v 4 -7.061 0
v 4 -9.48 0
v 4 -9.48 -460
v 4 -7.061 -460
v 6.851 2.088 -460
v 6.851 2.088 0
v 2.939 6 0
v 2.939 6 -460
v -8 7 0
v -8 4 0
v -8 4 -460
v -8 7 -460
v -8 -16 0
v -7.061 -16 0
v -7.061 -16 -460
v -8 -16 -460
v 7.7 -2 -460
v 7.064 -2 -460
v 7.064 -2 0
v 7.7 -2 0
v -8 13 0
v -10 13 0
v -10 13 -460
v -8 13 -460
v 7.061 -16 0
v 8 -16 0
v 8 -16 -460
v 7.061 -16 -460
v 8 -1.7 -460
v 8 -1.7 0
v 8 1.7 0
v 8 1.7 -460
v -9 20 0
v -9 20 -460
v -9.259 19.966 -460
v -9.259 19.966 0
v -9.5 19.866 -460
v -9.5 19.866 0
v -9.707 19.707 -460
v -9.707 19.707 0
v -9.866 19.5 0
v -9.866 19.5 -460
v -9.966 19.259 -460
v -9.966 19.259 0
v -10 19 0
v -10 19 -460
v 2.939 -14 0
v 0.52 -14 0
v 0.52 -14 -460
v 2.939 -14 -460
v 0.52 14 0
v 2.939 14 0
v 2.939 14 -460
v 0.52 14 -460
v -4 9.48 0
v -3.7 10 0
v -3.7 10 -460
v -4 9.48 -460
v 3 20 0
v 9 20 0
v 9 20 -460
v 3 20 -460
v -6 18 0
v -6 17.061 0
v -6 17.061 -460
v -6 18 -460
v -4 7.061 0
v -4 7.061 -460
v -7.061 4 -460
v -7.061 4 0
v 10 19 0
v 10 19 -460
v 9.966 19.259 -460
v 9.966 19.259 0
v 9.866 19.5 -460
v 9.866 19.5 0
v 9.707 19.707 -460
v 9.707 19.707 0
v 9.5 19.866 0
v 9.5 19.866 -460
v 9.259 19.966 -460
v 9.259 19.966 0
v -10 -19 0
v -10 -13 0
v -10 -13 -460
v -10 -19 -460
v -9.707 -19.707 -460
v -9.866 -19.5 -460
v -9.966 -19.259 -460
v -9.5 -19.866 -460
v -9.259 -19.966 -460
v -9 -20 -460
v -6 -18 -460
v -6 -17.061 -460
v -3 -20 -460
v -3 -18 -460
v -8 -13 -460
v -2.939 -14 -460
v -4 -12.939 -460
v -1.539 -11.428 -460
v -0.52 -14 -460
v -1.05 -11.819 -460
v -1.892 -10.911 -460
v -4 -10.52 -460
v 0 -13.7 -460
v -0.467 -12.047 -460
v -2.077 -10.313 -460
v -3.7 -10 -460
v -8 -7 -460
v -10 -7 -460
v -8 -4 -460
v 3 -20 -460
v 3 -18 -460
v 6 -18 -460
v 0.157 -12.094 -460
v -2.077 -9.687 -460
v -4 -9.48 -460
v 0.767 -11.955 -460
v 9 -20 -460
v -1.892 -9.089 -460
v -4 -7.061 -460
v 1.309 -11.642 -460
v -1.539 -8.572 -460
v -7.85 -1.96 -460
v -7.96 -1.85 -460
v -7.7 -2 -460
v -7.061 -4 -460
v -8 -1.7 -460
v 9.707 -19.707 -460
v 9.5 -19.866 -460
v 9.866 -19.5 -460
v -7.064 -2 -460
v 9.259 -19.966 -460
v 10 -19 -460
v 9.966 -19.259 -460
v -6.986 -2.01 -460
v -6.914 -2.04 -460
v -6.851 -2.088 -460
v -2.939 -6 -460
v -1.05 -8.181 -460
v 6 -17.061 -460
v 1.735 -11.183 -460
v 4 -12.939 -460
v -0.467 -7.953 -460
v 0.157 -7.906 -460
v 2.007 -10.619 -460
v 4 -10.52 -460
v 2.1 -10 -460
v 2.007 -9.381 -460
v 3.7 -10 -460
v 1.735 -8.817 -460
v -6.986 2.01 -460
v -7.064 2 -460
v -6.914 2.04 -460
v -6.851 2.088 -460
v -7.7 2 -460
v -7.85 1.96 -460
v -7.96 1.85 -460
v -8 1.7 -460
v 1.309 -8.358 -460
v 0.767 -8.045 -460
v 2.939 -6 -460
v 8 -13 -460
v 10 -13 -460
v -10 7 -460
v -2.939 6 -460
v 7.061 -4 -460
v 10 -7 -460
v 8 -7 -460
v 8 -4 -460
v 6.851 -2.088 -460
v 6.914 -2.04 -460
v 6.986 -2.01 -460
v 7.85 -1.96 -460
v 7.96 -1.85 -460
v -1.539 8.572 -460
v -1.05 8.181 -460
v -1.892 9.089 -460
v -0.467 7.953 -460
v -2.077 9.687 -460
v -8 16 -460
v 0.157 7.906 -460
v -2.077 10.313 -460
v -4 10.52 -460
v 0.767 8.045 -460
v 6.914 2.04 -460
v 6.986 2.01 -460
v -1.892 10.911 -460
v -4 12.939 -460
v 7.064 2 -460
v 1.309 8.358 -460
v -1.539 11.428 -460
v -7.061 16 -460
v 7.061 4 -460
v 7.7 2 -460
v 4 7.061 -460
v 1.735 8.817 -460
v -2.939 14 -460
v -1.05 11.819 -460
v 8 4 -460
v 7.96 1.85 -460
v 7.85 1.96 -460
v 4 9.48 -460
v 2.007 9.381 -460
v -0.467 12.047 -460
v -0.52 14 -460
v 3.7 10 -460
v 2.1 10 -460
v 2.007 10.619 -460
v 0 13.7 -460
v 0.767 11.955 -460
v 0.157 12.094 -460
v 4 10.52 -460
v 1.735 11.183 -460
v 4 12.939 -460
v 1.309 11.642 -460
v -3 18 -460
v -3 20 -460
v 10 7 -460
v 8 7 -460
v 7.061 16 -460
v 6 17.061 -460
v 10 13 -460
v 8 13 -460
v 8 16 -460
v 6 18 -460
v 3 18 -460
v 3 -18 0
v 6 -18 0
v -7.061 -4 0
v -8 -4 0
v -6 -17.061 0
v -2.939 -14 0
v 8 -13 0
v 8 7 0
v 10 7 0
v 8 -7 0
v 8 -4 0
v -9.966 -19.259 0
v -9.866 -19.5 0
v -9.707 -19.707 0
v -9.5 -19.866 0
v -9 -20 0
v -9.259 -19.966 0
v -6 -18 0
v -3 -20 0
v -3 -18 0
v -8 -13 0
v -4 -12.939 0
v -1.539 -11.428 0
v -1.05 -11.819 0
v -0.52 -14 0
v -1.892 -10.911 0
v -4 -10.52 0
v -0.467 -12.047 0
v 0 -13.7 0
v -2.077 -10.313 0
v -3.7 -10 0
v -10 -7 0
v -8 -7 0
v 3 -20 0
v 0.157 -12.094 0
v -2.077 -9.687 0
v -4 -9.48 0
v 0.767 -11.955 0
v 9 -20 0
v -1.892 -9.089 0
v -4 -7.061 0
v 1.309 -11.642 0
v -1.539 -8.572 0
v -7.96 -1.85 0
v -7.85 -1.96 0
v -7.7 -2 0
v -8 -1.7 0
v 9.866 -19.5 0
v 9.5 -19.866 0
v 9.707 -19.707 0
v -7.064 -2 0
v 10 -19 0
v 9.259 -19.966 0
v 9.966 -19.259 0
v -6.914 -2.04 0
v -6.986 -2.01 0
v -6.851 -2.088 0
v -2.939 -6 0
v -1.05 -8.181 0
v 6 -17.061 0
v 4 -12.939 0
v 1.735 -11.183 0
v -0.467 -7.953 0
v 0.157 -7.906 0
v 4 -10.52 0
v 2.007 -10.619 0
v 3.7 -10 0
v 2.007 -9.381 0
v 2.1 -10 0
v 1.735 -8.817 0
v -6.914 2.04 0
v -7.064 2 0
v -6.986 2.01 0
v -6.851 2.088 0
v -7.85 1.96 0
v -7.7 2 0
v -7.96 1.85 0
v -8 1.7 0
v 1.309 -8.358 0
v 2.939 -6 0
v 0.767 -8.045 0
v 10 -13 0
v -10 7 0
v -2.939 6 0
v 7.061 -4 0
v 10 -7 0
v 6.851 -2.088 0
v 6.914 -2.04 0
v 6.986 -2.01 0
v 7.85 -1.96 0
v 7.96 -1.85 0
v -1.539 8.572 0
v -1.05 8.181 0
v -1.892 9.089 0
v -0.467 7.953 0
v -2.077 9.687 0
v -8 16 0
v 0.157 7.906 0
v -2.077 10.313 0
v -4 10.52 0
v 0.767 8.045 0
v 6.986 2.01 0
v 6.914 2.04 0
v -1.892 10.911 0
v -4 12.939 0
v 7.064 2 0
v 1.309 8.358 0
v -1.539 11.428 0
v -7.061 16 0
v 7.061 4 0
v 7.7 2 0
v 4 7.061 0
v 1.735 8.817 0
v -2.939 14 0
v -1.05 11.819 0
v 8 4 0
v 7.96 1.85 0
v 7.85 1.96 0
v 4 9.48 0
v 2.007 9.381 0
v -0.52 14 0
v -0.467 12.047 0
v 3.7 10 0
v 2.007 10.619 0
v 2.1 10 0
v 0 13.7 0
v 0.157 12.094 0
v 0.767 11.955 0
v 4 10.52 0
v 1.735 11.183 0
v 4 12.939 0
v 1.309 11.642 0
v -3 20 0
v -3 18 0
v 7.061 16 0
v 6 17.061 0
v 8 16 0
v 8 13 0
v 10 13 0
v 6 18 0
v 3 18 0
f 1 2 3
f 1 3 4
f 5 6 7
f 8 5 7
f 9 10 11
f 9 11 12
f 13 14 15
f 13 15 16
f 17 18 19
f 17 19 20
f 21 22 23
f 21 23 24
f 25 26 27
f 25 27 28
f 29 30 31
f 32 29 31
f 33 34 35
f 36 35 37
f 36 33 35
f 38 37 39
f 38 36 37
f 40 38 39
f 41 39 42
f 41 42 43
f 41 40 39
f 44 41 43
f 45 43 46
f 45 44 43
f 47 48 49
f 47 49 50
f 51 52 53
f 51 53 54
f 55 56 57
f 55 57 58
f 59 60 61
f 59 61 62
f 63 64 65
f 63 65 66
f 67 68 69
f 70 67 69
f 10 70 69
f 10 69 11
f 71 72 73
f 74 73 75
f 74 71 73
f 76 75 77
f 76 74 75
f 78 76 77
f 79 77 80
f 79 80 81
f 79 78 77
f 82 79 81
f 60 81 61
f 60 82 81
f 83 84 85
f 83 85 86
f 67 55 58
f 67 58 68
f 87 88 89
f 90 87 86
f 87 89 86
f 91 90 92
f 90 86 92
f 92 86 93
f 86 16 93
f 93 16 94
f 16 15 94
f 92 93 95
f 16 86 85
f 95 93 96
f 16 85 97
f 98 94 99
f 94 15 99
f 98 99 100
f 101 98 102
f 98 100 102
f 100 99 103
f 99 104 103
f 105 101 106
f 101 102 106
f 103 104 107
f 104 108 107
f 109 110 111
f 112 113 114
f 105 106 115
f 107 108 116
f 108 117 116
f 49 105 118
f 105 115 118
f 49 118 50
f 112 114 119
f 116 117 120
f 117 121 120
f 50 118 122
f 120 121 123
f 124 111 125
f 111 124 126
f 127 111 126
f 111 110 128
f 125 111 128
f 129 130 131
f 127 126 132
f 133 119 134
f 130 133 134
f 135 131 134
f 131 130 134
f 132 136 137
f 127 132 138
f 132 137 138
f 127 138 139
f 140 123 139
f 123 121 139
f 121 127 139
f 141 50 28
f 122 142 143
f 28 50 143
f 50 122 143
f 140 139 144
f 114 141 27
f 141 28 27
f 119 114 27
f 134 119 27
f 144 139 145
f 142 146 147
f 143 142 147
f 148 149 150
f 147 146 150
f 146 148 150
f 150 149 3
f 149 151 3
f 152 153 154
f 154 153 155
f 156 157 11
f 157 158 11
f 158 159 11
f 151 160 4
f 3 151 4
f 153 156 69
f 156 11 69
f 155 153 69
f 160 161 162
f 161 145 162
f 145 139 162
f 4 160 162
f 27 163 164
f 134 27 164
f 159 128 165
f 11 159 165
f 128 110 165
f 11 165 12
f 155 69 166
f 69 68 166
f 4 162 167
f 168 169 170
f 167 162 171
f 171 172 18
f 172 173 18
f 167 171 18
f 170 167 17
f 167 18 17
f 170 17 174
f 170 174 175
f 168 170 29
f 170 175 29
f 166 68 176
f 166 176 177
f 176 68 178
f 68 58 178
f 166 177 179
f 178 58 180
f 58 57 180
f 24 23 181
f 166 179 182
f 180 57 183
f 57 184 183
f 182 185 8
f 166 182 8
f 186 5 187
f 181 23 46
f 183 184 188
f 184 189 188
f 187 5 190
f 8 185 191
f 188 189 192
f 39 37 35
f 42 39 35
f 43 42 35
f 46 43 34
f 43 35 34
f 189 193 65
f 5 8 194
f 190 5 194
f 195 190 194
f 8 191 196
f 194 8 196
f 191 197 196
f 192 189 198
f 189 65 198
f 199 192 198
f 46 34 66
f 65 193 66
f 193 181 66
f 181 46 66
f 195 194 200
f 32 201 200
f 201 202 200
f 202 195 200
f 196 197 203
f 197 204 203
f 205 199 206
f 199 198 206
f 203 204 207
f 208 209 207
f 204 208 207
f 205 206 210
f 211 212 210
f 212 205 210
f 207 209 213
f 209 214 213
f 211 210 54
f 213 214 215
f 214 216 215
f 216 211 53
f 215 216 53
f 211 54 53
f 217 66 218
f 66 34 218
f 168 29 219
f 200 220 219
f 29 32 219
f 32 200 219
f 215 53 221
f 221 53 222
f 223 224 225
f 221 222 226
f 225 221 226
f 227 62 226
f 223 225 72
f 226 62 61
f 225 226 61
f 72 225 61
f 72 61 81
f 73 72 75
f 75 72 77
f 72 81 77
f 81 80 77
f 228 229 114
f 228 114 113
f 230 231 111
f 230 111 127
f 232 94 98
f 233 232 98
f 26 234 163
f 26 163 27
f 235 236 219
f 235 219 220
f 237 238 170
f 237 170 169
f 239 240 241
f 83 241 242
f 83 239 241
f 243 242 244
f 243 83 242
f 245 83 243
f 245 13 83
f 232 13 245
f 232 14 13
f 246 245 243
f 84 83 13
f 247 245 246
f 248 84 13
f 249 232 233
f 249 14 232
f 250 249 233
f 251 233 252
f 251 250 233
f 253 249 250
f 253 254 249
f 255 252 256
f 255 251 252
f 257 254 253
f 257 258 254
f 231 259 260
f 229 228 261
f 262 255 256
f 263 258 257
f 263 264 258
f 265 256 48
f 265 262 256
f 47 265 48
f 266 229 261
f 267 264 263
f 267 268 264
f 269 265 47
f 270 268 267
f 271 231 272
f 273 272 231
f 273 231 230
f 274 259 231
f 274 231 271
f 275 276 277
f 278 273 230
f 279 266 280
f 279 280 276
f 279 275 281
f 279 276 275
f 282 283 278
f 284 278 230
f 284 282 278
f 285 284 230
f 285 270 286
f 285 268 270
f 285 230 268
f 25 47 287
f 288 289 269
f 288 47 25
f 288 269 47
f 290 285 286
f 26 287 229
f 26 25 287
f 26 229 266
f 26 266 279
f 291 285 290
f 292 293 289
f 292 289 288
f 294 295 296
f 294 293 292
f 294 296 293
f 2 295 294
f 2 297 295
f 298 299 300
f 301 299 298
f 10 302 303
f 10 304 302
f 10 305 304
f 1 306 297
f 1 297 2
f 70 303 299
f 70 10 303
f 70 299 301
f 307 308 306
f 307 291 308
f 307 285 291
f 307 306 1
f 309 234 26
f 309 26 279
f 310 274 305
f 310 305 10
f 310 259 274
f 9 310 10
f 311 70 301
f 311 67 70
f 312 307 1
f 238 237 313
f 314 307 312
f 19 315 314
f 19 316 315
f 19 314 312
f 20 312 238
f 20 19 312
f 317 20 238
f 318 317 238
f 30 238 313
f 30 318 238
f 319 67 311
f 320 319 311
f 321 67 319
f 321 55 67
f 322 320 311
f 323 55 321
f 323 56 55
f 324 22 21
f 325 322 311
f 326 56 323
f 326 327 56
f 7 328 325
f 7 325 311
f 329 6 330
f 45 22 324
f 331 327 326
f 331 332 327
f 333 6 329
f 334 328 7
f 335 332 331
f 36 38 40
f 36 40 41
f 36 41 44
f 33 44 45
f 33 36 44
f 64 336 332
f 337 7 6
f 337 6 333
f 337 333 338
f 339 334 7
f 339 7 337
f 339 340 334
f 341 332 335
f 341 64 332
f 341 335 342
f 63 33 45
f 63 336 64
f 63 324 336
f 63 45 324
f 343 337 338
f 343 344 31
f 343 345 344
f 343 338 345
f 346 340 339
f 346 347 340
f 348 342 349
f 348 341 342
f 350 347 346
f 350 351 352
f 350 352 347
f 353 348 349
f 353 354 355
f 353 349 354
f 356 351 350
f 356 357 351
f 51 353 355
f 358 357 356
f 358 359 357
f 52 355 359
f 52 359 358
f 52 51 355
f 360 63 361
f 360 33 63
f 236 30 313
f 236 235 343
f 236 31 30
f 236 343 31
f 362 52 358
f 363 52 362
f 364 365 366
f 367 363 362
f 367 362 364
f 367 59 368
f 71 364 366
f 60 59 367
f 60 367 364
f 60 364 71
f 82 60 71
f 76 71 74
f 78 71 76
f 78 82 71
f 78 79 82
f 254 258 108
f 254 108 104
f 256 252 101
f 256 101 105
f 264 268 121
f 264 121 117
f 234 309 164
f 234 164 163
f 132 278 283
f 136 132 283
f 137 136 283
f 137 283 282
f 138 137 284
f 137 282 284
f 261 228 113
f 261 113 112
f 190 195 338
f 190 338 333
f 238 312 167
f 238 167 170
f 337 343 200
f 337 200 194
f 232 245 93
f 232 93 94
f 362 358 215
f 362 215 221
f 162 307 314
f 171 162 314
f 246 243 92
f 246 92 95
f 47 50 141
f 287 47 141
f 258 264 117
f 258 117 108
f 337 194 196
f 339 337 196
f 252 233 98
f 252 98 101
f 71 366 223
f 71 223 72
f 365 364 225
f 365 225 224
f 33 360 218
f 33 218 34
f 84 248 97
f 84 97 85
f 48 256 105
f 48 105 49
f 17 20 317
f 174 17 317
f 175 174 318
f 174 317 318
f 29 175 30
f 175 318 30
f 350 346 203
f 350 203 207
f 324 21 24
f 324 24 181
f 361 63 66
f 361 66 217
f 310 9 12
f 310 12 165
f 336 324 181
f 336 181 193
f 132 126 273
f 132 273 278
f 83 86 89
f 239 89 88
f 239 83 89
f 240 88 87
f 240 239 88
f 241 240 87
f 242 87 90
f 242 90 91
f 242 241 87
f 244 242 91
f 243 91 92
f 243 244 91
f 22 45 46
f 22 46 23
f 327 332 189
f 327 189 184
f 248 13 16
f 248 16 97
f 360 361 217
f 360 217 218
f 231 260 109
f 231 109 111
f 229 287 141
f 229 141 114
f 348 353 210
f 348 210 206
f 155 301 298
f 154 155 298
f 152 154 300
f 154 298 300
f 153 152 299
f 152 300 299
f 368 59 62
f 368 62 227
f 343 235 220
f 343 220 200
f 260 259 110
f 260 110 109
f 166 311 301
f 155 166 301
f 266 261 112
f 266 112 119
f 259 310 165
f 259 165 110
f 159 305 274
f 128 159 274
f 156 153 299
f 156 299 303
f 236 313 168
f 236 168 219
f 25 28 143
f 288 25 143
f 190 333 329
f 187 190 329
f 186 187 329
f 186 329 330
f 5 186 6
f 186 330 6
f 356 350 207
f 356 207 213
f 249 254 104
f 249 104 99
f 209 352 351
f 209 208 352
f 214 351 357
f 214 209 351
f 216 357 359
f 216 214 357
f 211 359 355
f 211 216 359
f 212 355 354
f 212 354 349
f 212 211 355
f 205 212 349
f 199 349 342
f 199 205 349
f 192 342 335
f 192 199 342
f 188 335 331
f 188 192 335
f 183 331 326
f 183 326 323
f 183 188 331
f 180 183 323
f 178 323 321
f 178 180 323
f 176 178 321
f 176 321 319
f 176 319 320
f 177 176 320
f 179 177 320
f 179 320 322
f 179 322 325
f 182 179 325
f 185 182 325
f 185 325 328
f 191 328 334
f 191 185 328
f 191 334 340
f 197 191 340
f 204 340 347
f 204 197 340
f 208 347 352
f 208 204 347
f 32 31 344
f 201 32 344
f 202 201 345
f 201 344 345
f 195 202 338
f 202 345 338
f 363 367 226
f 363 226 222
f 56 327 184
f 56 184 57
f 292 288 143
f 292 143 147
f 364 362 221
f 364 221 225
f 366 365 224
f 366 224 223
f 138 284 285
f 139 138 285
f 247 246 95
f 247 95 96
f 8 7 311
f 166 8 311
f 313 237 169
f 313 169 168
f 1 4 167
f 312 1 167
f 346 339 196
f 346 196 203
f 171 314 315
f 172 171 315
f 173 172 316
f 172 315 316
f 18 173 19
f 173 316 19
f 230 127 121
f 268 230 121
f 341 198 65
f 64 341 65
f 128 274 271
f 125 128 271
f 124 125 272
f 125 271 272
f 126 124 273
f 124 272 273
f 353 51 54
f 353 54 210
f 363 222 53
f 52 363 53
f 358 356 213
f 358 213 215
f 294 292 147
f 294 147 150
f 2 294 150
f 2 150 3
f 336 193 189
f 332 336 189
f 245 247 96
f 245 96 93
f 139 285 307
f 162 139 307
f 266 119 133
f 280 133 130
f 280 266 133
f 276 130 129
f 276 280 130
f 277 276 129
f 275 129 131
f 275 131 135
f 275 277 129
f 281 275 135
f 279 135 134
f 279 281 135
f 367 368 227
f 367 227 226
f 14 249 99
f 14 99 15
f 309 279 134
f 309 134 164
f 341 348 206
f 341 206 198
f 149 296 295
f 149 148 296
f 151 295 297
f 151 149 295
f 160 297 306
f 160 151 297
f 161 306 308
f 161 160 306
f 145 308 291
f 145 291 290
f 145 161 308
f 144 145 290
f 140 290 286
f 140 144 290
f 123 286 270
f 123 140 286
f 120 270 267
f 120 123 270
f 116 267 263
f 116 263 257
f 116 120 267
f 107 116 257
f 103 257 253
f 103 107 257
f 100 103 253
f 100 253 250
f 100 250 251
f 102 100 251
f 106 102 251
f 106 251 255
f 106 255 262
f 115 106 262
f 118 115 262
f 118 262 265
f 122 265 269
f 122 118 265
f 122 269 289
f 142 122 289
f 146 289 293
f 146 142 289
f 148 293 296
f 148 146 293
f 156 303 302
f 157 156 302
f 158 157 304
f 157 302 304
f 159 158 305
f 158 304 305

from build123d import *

# Parameters (mm, degrees)
BOSS_EXTRUDE1_DEPTH = 460
SKETCH2_W           = 460
SKETCH2_H           = 2.1
SKETCH3_W           = 460
SKETCH3_H           = 2.1


with BuildPart() as part:
    # Sketch1 → Boss-Extrude1 (new body)
    with BuildSketch(Plane.XY):
        with BuildLine():
            Line((-9, -20), (-3, -20))
            Line((-3, -20), (-3, -18))
            Line((-3, -18), (-6, -18))
            Line((-6, -18), (-6, -17.060660172))
            Line((-6, -17.060660172), (-2.939339828, -14))
            Line((-2.939339828, -14), (-0.519615242, -14))
            Line((-0.519615242, -14), (0, -13.7))
            Line((0, -13.7), (0.519615242, -14))
            Line((0.519615242, -14), (2.939339828, -14))
            Line((2.939339828, -14), (6, -17.060660172))
            Line((6, -17.060660172), (6, -18))
            Line((6, -18), (3, -18))
            Line((3, -18), (3, -20))
            Line((3, -20), (9, -20))
            ThreePointArc((9, -20), (9.707106781, -19.707106781), (10, -19))
            Line((10, -19), (10, -13))
            Line((10, -13), (8, -13))
            Line((8, -13), (8, -16))
            Line((8, -16), (7.060660172, -16))
            Line((7.060660172, -16), (4, -12.939339828))
            Line((4, -12.939339828), (4, -10.519615242))
            Line((4, -10.519615242), (3.7, -10))
            Line((3.7, -10), (4, -9.480384758))
            Line((4, -9.480384758), (4, -7.060660172))
            Line((4, -7.060660172), (7.060660172, -4))
            Line((7.060660172, -4), (8, -4))
            Line((8, -4), (8, -7))
            Line((8, -7), (10, -7))
            Line((10, -7), (10, 7))
            Line((10, 7), (8, 7))
            Line((8, 7), (8, 4))
            Line((8, 4), (7.060660172, 4))
            Line((7.060660172, 4), (4, 7.060660172))
            Line((4, 7.060660172), (4, 9.480384758))
            Line((4, 9.480384758), (3.7, 10))
            Line((3.7, 10), (4, 10.519615242))
            Line((4, 10.519615242), (4, 12.939339828))
            Line((4, 12.939339828), (7.060660172, 16))
            Line((7.060660172, 16), (8, 16))
            Line((8, 16), (8, 13))
            Line((8, 13), (10, 13))
            Line((10, 13), (10, 19))
            ThreePointArc((10, 19), (9.707106781, 19.707106781), (9, 20))
            Line((9, 20), (3, 20))
            Line((3, 20), (3, 18))
            Line((3, 18), (6, 18))
            Line((6, 18), (6, 17.060660172))
            Line((6, 17.060660172), (2.939339828, 14))
            Line((2.939339828, 14), (0.519615242, 14))
            Line((0.519615242, 14), (0, 13.7))
            Line((0, 13.7), (-0.519615242, 14))
            Line((-0.519615242, 14), (-2.939339828, 14))
            Line((-2.939339828, 14), (-6, 17.060660172))
            Line((-6, 17.060660172), (-6, 18))
            Line((-6, 18), (-3, 18))
            Line((-3, 18), (-3, 20))
            Line((-3, 20), (-9, 20))
            ThreePointArc((-9, 20), (-9.707106781, 19.707106781), (-10, 19))
            Line((-10, 19), (-10, 13))
            Line((-10, 13), (-8, 13))
            Line((-8, 13), (-8, 16))
            Line((-8, 16), (-7.060660172, 16))
            Line((-7.060660172, 16), (-4, 12.939339828))
            Line((-4, 12.939339828), (-4, 10.519615242))
            Line((-4, 10.519615242), (-3.7, 10))
            Line((-3.7, 10), (-4, 9.480384758))
            Line((-4, 9.480384758), (-4, 7.060660172))
            Line((-4, 7.060660172), (-7.060660172, 4))
            Line((-7.060660172, 4), (-8, 4))
            Line((-8, 4), (-8, 7))
            Line((-8, 7), (-10, 7))
            Line((-10, 7), (-10, -7))
            Line((-10, -7), (-8, -7))
            Line((-8, -7), (-8, -4))
            Line((-8, -4), (-7.060660172, -4))
            Line((-7.060660172, -4), (-4, -7.060660172))
            Line((-4, -7.060660172), (-4, -9.480384758))
            Line((-4, -9.480384758), (-3.7, -10))
            Line((-3.7, -10), (-4, -10.519615242))
            Line((-4, -10.519615242), (-4, -12.939339828))
            Line((-4, -12.939339828), (-7.060660172, -16))
            Line((-7.060660172, -16), (-8, -16))
            Line((-8, -16), (-8, -13))
            Line((-8, -13), (-10, -13))
            Line((-10, -13), (-10, -19))
            ThreePointArc((-10, -19), (-9.707106781, -19.707106781), (-9, -20))
        make_face()
        with BuildLine():
            Line((-7.7, -2), (-7.063603897, -2))
            ThreePointArc((-7.063603897, -2), (-6.948798867, -2.02283614), (-6.851471863, -2.087867966))
            Line((-6.851471863, -2.087867966), (-2.939339828, -6))
            Line((-2.939339828, -6), (2.939339828, -6))
            Line((2.939339828, -6), (6.851471863, -2.087867966))
            ThreePointArc((6.851471863, -2.087867966), (6.948798867, -2.02283614), (7.063603897, -2))
            Line((7.063603897, -2), (7.7, -2))
            ThreePointArc((7.7, -2), (7.912132034, -1.912132034), (8, -1.7))
            Line((8, -1.7), (8, 1.7))
            ThreePointArc((8, 1.7), (7.912132034, 1.912132034), (7.7, 2))
            Line((7.7, 2), (7.063603897, 2))
            ThreePointArc((7.063603897, 2), (6.948798867, 2.02283614), (6.851471863, 2.087867966))
            Line((6.851471863, 2.087867966), (2.939339828, 6))
            Line((2.939339828, 6), (-2.939339828, 6))
            Line((-2.939339828, 6), (-6.851471863, 2.087867966))
            ThreePointArc((-6.851471863, 2.087867966), (-6.948798867, 2.02283614), (-7.063603897, 2))
            Line((-7.063603897, 2), (-7.7, 2))
            ThreePointArc((-7.7, 2), (-7.912132034, 1.912132034), (-8, 1.7))
            Line((-8, 1.7), (-8, -1.7))
            ThreePointArc((-8, -1.7), (-7.912132034, -1.912132034), (-7.7, -2))
        make_face(mode=Mode.SUBTRACT)
    extrude(amount=-BOSS_EXTRUDE1_DEPTH)

    # Sketch2 → Cut-Revolve1 (revolve, cut)
    with BuildSketch(Plane(origin=(0, 0, 0), x_dir=(0, 0, -1), z_dir=(1, 0, 0)), mode=Mode.PRIVATE) as cut_revolve1_sk:
        with Locations((230, 11.05)):
            Rectangle(SKETCH2_W, SKETCH2_H)
    revolve(cut_revolve1_sk.sketch.rotate(Axis((0, 10, -460), (0, 0, 1)), 270), axis=Axis((0, 10, -460), (0, 0, 1)), mode=Mode.SUBTRACT)

    # Sketch3 → Cut-Revolve2 (revolve, cut)
    with BuildSketch(Plane(origin=(0, 0, 0), x_dir=(0, 0, -1), z_dir=(1, 0, 0)), mode=Mode.PRIVATE) as cut_revolve2_sk:
        with Locations((230, -8.95)):
            Rectangle(SKETCH3_W, SKETCH3_H)
    revolve(cut_revolve2_sk.sketch.rotate(Axis((0, -10, -460), (0, 0, 1)), 270), axis=Axis((0, -10, -460), (0, 0, 1)), mode=Mode.SUBTRACT)


solid = part.part
